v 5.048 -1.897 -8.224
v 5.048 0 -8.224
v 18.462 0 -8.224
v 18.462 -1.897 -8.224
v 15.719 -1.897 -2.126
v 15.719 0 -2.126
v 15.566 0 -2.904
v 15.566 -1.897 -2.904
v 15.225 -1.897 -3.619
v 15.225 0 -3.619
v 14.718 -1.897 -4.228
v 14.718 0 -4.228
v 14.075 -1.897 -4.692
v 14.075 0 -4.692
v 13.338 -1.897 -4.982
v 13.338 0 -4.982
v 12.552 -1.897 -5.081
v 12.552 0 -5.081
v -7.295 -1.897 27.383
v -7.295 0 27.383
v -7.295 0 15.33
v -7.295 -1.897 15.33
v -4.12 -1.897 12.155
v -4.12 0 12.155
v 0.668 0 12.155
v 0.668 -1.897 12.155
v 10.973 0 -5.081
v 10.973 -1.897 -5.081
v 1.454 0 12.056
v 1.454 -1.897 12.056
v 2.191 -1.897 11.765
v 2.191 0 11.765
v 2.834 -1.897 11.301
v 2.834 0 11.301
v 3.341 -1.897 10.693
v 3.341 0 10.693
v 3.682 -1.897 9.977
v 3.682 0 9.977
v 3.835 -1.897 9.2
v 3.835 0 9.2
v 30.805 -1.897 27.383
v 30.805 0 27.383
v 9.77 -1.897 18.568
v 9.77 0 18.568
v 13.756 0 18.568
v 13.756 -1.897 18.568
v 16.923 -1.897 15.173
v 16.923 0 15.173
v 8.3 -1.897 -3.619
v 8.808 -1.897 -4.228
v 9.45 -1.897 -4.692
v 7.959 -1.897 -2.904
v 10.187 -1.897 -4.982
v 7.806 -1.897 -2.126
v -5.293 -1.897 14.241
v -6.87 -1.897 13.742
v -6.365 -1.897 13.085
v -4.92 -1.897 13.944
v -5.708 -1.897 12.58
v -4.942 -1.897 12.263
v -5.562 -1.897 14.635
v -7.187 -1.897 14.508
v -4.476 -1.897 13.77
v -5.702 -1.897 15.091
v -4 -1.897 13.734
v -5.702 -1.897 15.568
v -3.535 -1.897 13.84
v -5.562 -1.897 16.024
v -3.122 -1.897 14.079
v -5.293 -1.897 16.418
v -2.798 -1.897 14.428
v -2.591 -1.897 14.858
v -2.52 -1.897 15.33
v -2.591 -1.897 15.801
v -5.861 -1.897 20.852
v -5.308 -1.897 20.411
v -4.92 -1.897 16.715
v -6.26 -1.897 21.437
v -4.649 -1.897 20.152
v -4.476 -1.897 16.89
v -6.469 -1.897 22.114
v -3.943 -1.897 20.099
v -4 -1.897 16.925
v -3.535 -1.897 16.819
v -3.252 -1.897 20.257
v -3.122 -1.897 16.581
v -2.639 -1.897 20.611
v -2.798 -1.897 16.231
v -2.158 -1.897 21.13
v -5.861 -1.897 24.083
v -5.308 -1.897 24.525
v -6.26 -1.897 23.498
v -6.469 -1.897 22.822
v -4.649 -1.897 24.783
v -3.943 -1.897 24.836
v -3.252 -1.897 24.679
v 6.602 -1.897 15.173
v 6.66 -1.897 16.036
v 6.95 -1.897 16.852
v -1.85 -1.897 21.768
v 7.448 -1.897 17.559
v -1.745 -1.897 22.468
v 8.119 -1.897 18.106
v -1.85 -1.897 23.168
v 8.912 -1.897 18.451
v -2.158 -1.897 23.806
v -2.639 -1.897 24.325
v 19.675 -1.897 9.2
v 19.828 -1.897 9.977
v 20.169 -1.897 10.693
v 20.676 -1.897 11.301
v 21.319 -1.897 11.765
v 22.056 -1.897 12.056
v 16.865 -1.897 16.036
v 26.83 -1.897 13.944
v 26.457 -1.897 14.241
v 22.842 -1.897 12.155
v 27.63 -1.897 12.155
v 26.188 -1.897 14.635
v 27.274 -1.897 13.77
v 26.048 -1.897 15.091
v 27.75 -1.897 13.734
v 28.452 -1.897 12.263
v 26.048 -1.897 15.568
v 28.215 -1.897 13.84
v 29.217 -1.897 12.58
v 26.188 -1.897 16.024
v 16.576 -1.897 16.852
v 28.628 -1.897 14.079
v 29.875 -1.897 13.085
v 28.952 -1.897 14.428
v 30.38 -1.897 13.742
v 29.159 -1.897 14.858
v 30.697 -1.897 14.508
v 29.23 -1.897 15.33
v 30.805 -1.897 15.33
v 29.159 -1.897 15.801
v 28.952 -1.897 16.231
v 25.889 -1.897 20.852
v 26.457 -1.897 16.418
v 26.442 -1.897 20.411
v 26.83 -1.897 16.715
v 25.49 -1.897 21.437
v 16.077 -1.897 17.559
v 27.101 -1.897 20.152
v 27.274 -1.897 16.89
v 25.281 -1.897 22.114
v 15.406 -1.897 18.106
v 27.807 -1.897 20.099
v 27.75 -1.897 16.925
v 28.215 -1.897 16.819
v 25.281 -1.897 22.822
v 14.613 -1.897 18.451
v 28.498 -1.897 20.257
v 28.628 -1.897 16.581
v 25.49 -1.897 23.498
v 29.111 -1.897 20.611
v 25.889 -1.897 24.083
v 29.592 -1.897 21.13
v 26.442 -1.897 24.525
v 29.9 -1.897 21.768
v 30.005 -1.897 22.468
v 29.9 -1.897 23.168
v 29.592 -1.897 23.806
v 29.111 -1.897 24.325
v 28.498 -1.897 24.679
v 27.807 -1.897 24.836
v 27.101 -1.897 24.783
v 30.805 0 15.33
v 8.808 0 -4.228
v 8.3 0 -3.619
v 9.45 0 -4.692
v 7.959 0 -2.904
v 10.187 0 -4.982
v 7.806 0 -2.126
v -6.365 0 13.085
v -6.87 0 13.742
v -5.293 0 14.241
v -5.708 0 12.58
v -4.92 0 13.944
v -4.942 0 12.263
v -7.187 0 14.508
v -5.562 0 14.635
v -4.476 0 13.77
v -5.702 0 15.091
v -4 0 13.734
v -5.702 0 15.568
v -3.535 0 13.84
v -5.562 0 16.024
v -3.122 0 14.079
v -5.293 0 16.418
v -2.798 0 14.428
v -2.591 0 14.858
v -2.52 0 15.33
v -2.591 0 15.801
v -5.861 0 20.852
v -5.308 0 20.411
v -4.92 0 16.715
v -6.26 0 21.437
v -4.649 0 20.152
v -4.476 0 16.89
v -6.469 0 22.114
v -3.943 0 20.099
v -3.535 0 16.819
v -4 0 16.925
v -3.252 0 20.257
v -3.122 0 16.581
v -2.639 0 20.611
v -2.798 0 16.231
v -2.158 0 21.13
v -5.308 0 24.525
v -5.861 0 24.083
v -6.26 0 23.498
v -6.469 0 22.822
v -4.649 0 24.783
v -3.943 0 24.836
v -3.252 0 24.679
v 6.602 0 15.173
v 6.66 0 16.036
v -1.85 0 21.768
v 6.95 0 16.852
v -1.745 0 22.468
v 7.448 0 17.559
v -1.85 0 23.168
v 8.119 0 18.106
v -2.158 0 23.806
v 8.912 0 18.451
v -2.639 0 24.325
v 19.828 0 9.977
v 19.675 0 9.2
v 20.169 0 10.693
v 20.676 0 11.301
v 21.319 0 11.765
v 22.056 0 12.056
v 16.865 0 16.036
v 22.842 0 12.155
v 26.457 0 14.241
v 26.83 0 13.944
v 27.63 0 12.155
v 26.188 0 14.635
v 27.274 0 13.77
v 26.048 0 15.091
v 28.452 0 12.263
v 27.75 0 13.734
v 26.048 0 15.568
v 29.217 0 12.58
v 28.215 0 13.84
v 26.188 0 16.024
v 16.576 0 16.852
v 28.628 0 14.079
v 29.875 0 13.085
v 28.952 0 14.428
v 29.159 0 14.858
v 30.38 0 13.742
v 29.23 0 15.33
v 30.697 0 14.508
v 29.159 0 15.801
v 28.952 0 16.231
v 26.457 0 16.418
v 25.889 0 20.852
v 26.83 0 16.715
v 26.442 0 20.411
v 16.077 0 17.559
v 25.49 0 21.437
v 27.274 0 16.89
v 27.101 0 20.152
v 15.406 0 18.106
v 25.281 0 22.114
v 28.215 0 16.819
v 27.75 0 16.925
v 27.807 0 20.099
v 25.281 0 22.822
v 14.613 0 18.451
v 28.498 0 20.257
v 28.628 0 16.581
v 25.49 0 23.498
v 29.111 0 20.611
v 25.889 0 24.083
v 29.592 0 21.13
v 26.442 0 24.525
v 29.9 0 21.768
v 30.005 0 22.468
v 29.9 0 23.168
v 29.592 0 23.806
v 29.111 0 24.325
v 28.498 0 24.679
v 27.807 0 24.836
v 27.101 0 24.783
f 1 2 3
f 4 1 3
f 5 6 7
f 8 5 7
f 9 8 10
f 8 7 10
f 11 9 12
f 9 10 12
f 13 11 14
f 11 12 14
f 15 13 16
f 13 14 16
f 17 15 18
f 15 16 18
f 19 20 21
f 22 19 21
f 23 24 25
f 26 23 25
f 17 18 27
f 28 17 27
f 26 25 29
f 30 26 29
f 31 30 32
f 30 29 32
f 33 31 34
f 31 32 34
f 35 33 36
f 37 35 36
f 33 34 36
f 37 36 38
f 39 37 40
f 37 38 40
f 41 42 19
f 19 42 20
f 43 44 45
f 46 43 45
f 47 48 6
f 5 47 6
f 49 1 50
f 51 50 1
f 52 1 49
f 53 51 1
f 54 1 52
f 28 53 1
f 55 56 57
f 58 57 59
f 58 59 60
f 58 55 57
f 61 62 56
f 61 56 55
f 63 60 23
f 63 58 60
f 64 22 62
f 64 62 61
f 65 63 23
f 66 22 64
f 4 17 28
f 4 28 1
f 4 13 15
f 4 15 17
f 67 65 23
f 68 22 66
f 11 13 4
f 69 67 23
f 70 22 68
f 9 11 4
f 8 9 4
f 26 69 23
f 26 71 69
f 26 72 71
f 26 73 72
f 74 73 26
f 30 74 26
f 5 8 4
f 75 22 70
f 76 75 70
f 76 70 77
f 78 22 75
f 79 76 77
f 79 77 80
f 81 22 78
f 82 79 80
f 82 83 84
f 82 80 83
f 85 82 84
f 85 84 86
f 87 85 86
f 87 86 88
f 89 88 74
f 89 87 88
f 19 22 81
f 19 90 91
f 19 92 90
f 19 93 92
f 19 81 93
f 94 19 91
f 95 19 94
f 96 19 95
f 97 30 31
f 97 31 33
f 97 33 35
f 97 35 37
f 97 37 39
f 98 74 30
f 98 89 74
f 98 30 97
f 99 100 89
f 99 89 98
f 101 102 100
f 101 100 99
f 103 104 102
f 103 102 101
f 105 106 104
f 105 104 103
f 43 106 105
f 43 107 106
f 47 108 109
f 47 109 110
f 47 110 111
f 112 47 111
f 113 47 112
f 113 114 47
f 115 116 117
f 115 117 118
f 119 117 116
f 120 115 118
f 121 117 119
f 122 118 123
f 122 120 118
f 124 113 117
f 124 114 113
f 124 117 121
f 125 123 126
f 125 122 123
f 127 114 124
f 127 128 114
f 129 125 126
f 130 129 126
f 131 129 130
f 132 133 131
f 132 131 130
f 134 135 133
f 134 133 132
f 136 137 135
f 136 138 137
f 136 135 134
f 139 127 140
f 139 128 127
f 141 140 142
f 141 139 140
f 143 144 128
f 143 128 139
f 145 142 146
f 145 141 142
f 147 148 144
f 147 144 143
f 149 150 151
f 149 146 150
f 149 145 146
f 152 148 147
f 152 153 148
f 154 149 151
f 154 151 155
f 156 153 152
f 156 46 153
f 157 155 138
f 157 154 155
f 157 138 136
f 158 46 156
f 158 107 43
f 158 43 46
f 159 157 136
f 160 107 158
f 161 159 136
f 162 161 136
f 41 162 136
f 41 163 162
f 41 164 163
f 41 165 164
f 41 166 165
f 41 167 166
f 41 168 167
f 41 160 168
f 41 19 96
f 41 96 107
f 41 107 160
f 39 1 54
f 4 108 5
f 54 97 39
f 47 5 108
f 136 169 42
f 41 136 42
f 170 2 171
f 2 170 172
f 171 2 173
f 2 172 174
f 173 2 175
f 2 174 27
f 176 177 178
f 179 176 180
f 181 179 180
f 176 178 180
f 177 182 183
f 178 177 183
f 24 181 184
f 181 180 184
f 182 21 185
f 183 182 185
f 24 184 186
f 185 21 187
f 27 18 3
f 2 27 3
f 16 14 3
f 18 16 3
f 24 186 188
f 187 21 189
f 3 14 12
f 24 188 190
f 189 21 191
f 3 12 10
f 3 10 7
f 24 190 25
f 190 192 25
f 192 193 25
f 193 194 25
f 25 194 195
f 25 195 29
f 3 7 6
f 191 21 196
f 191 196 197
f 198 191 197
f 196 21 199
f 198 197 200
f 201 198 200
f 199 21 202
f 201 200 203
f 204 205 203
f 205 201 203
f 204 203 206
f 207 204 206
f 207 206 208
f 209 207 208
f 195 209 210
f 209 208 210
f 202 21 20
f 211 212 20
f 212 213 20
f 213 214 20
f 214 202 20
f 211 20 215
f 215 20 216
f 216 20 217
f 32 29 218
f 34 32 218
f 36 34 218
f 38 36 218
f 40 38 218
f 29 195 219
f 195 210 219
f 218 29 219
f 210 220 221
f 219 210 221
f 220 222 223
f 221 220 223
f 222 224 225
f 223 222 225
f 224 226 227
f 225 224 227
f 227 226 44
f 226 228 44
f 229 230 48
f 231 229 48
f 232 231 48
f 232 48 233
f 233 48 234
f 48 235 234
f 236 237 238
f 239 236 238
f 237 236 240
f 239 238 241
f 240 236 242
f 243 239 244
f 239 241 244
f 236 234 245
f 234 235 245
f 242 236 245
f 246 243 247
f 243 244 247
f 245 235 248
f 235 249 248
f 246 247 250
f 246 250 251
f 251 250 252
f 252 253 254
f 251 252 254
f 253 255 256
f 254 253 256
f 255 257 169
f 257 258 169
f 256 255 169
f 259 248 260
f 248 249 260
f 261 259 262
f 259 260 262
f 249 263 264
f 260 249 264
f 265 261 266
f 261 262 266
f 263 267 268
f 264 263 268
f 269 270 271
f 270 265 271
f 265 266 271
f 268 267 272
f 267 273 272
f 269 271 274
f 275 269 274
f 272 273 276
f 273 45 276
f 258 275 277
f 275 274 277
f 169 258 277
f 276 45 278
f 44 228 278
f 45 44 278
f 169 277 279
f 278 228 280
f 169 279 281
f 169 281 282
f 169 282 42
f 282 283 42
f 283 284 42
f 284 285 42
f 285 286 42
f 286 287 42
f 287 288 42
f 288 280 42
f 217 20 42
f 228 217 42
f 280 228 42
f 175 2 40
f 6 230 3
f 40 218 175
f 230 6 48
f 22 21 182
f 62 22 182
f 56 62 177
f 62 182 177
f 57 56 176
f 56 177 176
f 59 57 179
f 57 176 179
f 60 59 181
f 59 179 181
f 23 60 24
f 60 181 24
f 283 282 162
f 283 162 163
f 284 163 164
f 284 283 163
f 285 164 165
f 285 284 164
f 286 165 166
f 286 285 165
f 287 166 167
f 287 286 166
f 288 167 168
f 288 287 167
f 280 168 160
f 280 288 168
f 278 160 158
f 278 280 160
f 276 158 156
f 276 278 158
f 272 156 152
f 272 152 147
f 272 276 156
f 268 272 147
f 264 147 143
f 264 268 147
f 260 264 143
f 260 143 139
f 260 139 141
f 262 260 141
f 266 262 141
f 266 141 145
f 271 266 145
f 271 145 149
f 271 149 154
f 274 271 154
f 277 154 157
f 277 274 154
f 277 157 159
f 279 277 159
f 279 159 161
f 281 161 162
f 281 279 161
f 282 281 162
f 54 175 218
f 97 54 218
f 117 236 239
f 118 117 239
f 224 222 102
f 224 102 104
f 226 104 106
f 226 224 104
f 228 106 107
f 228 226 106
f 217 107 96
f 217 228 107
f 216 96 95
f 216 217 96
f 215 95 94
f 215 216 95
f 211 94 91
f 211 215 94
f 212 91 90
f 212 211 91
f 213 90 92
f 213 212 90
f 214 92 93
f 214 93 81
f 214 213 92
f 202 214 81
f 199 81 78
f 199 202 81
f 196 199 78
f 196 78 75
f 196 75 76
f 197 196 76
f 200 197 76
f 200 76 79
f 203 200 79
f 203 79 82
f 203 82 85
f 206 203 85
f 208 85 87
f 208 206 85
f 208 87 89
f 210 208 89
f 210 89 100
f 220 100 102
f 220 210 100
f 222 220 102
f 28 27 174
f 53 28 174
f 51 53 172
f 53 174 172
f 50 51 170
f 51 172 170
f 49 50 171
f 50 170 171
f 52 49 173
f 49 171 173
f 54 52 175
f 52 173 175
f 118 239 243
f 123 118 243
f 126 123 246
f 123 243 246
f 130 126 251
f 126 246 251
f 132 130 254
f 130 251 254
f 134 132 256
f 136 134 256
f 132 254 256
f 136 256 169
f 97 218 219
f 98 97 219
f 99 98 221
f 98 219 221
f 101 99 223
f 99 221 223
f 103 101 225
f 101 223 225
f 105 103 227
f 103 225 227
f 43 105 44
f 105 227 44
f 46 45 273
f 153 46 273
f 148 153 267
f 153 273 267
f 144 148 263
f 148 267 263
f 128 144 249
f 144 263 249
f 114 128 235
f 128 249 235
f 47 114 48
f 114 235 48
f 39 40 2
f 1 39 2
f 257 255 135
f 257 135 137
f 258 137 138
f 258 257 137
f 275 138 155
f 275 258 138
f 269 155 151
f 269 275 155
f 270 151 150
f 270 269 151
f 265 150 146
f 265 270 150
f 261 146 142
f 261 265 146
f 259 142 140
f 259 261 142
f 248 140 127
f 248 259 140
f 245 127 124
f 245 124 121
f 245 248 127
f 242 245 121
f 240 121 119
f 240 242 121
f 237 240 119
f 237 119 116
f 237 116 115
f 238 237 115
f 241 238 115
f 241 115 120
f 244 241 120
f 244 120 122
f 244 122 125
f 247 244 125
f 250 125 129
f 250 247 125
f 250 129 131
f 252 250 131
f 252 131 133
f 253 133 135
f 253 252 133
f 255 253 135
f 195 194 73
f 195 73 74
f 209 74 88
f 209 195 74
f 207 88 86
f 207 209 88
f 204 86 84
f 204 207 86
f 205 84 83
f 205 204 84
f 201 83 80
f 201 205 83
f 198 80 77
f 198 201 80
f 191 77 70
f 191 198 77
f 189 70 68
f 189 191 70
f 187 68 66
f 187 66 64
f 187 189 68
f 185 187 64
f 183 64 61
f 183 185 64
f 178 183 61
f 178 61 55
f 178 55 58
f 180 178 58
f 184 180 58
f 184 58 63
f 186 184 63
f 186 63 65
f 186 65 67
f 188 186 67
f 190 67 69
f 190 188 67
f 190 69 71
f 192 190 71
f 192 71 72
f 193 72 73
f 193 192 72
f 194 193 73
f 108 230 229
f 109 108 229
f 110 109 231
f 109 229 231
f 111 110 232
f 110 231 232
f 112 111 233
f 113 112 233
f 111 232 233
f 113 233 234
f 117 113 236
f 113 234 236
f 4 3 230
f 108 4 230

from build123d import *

# Parameters (mm, degrees)
F0_R     = 1.6002
F0_R_2   = 2.375179
F1_DEPTH = 1.89738


with BuildPart() as f1:
    # F0 (on Front) → F1 (new body)
    with BuildSketch(Plane.XZ):
        with BuildLine():
            Line((30.804955, 27.38282), (-7.295045, 27.38282))
            Line((-7.295045, 27.38282), (-7.295045, 15.329635))
            ThreePointArc((-7.295045, 15.329635), (-6.365109, 13.084571), (-4.120045, 12.154635))
            Line((-4.120045, 12.154635), (0.667936, 12.154635))
            ThreePointArc((0.667936, 12.154635), (2.833681, 11.30131), (3.835278, 9.200021))
            Line((3.835278, 9.200021), (5.047635, -8.223763))
            Line((5.047635, -8.223763), (18.462275, -8.223763))
            Line((18.462275, -8.223763), (19.674632, 9.200021))
            ThreePointArc((19.674632, 9.200021), (20.676229, 11.30131), (22.841974, 12.154635))
            Line((22.841974, 12.154635), (27.629955, 12.154635))
            ThreePointArc((27.629955, 12.154635), (29.875019, 13.084571), (30.804955, 15.329635))
            Line((30.804955, 15.329635), (30.804955, 27.38282))
        make_face()
        with BuildLine():
            ThreePointArc((10.973398, -5.08104), (8.807653, -4.227715), (7.806056, -2.126426))
            Line((7.806056, -2.126426), (6.602346, 15.173074))
            ThreePointArc((6.602346, 15.173074), (7.448014, 17.559204), (9.769688, 18.568459))
            Line((9.769688, 18.568459), (13.755501, 18.568459))
            ThreePointArc((13.755501, 18.568459), (16.077176, 17.559204), (16.922843, 15.173074))
            Line((16.922843, 15.173074), (15.719134, -2.126426))
            ThreePointArc((15.719134, -2.126426), (14.717537, -4.227715), (12.551792, -5.08104))
            Line((12.551792, -5.08104), (10.973398, -5.08104))
        make_face(mode=Mode.SUBTRACT)
        with Locations((-4.120045, 15.329635)):
            Circle(F0_R, mode=Mode.SUBTRACT)
        with Locations((-4.120045, 22.467641)):
            Circle(F0_R_2, mode=Mode.SUBTRACT)
        with Locations((27.629955, 15.329635)):
            Circle(F0_R, mode=Mode.SUBTRACT)
        with Locations((27.629955, 22.467641)):
            Circle(F0_R_2, mode=Mode.SUBTRACT)
    extrude(amount=F1_DEPTH)


solid = f1.part
